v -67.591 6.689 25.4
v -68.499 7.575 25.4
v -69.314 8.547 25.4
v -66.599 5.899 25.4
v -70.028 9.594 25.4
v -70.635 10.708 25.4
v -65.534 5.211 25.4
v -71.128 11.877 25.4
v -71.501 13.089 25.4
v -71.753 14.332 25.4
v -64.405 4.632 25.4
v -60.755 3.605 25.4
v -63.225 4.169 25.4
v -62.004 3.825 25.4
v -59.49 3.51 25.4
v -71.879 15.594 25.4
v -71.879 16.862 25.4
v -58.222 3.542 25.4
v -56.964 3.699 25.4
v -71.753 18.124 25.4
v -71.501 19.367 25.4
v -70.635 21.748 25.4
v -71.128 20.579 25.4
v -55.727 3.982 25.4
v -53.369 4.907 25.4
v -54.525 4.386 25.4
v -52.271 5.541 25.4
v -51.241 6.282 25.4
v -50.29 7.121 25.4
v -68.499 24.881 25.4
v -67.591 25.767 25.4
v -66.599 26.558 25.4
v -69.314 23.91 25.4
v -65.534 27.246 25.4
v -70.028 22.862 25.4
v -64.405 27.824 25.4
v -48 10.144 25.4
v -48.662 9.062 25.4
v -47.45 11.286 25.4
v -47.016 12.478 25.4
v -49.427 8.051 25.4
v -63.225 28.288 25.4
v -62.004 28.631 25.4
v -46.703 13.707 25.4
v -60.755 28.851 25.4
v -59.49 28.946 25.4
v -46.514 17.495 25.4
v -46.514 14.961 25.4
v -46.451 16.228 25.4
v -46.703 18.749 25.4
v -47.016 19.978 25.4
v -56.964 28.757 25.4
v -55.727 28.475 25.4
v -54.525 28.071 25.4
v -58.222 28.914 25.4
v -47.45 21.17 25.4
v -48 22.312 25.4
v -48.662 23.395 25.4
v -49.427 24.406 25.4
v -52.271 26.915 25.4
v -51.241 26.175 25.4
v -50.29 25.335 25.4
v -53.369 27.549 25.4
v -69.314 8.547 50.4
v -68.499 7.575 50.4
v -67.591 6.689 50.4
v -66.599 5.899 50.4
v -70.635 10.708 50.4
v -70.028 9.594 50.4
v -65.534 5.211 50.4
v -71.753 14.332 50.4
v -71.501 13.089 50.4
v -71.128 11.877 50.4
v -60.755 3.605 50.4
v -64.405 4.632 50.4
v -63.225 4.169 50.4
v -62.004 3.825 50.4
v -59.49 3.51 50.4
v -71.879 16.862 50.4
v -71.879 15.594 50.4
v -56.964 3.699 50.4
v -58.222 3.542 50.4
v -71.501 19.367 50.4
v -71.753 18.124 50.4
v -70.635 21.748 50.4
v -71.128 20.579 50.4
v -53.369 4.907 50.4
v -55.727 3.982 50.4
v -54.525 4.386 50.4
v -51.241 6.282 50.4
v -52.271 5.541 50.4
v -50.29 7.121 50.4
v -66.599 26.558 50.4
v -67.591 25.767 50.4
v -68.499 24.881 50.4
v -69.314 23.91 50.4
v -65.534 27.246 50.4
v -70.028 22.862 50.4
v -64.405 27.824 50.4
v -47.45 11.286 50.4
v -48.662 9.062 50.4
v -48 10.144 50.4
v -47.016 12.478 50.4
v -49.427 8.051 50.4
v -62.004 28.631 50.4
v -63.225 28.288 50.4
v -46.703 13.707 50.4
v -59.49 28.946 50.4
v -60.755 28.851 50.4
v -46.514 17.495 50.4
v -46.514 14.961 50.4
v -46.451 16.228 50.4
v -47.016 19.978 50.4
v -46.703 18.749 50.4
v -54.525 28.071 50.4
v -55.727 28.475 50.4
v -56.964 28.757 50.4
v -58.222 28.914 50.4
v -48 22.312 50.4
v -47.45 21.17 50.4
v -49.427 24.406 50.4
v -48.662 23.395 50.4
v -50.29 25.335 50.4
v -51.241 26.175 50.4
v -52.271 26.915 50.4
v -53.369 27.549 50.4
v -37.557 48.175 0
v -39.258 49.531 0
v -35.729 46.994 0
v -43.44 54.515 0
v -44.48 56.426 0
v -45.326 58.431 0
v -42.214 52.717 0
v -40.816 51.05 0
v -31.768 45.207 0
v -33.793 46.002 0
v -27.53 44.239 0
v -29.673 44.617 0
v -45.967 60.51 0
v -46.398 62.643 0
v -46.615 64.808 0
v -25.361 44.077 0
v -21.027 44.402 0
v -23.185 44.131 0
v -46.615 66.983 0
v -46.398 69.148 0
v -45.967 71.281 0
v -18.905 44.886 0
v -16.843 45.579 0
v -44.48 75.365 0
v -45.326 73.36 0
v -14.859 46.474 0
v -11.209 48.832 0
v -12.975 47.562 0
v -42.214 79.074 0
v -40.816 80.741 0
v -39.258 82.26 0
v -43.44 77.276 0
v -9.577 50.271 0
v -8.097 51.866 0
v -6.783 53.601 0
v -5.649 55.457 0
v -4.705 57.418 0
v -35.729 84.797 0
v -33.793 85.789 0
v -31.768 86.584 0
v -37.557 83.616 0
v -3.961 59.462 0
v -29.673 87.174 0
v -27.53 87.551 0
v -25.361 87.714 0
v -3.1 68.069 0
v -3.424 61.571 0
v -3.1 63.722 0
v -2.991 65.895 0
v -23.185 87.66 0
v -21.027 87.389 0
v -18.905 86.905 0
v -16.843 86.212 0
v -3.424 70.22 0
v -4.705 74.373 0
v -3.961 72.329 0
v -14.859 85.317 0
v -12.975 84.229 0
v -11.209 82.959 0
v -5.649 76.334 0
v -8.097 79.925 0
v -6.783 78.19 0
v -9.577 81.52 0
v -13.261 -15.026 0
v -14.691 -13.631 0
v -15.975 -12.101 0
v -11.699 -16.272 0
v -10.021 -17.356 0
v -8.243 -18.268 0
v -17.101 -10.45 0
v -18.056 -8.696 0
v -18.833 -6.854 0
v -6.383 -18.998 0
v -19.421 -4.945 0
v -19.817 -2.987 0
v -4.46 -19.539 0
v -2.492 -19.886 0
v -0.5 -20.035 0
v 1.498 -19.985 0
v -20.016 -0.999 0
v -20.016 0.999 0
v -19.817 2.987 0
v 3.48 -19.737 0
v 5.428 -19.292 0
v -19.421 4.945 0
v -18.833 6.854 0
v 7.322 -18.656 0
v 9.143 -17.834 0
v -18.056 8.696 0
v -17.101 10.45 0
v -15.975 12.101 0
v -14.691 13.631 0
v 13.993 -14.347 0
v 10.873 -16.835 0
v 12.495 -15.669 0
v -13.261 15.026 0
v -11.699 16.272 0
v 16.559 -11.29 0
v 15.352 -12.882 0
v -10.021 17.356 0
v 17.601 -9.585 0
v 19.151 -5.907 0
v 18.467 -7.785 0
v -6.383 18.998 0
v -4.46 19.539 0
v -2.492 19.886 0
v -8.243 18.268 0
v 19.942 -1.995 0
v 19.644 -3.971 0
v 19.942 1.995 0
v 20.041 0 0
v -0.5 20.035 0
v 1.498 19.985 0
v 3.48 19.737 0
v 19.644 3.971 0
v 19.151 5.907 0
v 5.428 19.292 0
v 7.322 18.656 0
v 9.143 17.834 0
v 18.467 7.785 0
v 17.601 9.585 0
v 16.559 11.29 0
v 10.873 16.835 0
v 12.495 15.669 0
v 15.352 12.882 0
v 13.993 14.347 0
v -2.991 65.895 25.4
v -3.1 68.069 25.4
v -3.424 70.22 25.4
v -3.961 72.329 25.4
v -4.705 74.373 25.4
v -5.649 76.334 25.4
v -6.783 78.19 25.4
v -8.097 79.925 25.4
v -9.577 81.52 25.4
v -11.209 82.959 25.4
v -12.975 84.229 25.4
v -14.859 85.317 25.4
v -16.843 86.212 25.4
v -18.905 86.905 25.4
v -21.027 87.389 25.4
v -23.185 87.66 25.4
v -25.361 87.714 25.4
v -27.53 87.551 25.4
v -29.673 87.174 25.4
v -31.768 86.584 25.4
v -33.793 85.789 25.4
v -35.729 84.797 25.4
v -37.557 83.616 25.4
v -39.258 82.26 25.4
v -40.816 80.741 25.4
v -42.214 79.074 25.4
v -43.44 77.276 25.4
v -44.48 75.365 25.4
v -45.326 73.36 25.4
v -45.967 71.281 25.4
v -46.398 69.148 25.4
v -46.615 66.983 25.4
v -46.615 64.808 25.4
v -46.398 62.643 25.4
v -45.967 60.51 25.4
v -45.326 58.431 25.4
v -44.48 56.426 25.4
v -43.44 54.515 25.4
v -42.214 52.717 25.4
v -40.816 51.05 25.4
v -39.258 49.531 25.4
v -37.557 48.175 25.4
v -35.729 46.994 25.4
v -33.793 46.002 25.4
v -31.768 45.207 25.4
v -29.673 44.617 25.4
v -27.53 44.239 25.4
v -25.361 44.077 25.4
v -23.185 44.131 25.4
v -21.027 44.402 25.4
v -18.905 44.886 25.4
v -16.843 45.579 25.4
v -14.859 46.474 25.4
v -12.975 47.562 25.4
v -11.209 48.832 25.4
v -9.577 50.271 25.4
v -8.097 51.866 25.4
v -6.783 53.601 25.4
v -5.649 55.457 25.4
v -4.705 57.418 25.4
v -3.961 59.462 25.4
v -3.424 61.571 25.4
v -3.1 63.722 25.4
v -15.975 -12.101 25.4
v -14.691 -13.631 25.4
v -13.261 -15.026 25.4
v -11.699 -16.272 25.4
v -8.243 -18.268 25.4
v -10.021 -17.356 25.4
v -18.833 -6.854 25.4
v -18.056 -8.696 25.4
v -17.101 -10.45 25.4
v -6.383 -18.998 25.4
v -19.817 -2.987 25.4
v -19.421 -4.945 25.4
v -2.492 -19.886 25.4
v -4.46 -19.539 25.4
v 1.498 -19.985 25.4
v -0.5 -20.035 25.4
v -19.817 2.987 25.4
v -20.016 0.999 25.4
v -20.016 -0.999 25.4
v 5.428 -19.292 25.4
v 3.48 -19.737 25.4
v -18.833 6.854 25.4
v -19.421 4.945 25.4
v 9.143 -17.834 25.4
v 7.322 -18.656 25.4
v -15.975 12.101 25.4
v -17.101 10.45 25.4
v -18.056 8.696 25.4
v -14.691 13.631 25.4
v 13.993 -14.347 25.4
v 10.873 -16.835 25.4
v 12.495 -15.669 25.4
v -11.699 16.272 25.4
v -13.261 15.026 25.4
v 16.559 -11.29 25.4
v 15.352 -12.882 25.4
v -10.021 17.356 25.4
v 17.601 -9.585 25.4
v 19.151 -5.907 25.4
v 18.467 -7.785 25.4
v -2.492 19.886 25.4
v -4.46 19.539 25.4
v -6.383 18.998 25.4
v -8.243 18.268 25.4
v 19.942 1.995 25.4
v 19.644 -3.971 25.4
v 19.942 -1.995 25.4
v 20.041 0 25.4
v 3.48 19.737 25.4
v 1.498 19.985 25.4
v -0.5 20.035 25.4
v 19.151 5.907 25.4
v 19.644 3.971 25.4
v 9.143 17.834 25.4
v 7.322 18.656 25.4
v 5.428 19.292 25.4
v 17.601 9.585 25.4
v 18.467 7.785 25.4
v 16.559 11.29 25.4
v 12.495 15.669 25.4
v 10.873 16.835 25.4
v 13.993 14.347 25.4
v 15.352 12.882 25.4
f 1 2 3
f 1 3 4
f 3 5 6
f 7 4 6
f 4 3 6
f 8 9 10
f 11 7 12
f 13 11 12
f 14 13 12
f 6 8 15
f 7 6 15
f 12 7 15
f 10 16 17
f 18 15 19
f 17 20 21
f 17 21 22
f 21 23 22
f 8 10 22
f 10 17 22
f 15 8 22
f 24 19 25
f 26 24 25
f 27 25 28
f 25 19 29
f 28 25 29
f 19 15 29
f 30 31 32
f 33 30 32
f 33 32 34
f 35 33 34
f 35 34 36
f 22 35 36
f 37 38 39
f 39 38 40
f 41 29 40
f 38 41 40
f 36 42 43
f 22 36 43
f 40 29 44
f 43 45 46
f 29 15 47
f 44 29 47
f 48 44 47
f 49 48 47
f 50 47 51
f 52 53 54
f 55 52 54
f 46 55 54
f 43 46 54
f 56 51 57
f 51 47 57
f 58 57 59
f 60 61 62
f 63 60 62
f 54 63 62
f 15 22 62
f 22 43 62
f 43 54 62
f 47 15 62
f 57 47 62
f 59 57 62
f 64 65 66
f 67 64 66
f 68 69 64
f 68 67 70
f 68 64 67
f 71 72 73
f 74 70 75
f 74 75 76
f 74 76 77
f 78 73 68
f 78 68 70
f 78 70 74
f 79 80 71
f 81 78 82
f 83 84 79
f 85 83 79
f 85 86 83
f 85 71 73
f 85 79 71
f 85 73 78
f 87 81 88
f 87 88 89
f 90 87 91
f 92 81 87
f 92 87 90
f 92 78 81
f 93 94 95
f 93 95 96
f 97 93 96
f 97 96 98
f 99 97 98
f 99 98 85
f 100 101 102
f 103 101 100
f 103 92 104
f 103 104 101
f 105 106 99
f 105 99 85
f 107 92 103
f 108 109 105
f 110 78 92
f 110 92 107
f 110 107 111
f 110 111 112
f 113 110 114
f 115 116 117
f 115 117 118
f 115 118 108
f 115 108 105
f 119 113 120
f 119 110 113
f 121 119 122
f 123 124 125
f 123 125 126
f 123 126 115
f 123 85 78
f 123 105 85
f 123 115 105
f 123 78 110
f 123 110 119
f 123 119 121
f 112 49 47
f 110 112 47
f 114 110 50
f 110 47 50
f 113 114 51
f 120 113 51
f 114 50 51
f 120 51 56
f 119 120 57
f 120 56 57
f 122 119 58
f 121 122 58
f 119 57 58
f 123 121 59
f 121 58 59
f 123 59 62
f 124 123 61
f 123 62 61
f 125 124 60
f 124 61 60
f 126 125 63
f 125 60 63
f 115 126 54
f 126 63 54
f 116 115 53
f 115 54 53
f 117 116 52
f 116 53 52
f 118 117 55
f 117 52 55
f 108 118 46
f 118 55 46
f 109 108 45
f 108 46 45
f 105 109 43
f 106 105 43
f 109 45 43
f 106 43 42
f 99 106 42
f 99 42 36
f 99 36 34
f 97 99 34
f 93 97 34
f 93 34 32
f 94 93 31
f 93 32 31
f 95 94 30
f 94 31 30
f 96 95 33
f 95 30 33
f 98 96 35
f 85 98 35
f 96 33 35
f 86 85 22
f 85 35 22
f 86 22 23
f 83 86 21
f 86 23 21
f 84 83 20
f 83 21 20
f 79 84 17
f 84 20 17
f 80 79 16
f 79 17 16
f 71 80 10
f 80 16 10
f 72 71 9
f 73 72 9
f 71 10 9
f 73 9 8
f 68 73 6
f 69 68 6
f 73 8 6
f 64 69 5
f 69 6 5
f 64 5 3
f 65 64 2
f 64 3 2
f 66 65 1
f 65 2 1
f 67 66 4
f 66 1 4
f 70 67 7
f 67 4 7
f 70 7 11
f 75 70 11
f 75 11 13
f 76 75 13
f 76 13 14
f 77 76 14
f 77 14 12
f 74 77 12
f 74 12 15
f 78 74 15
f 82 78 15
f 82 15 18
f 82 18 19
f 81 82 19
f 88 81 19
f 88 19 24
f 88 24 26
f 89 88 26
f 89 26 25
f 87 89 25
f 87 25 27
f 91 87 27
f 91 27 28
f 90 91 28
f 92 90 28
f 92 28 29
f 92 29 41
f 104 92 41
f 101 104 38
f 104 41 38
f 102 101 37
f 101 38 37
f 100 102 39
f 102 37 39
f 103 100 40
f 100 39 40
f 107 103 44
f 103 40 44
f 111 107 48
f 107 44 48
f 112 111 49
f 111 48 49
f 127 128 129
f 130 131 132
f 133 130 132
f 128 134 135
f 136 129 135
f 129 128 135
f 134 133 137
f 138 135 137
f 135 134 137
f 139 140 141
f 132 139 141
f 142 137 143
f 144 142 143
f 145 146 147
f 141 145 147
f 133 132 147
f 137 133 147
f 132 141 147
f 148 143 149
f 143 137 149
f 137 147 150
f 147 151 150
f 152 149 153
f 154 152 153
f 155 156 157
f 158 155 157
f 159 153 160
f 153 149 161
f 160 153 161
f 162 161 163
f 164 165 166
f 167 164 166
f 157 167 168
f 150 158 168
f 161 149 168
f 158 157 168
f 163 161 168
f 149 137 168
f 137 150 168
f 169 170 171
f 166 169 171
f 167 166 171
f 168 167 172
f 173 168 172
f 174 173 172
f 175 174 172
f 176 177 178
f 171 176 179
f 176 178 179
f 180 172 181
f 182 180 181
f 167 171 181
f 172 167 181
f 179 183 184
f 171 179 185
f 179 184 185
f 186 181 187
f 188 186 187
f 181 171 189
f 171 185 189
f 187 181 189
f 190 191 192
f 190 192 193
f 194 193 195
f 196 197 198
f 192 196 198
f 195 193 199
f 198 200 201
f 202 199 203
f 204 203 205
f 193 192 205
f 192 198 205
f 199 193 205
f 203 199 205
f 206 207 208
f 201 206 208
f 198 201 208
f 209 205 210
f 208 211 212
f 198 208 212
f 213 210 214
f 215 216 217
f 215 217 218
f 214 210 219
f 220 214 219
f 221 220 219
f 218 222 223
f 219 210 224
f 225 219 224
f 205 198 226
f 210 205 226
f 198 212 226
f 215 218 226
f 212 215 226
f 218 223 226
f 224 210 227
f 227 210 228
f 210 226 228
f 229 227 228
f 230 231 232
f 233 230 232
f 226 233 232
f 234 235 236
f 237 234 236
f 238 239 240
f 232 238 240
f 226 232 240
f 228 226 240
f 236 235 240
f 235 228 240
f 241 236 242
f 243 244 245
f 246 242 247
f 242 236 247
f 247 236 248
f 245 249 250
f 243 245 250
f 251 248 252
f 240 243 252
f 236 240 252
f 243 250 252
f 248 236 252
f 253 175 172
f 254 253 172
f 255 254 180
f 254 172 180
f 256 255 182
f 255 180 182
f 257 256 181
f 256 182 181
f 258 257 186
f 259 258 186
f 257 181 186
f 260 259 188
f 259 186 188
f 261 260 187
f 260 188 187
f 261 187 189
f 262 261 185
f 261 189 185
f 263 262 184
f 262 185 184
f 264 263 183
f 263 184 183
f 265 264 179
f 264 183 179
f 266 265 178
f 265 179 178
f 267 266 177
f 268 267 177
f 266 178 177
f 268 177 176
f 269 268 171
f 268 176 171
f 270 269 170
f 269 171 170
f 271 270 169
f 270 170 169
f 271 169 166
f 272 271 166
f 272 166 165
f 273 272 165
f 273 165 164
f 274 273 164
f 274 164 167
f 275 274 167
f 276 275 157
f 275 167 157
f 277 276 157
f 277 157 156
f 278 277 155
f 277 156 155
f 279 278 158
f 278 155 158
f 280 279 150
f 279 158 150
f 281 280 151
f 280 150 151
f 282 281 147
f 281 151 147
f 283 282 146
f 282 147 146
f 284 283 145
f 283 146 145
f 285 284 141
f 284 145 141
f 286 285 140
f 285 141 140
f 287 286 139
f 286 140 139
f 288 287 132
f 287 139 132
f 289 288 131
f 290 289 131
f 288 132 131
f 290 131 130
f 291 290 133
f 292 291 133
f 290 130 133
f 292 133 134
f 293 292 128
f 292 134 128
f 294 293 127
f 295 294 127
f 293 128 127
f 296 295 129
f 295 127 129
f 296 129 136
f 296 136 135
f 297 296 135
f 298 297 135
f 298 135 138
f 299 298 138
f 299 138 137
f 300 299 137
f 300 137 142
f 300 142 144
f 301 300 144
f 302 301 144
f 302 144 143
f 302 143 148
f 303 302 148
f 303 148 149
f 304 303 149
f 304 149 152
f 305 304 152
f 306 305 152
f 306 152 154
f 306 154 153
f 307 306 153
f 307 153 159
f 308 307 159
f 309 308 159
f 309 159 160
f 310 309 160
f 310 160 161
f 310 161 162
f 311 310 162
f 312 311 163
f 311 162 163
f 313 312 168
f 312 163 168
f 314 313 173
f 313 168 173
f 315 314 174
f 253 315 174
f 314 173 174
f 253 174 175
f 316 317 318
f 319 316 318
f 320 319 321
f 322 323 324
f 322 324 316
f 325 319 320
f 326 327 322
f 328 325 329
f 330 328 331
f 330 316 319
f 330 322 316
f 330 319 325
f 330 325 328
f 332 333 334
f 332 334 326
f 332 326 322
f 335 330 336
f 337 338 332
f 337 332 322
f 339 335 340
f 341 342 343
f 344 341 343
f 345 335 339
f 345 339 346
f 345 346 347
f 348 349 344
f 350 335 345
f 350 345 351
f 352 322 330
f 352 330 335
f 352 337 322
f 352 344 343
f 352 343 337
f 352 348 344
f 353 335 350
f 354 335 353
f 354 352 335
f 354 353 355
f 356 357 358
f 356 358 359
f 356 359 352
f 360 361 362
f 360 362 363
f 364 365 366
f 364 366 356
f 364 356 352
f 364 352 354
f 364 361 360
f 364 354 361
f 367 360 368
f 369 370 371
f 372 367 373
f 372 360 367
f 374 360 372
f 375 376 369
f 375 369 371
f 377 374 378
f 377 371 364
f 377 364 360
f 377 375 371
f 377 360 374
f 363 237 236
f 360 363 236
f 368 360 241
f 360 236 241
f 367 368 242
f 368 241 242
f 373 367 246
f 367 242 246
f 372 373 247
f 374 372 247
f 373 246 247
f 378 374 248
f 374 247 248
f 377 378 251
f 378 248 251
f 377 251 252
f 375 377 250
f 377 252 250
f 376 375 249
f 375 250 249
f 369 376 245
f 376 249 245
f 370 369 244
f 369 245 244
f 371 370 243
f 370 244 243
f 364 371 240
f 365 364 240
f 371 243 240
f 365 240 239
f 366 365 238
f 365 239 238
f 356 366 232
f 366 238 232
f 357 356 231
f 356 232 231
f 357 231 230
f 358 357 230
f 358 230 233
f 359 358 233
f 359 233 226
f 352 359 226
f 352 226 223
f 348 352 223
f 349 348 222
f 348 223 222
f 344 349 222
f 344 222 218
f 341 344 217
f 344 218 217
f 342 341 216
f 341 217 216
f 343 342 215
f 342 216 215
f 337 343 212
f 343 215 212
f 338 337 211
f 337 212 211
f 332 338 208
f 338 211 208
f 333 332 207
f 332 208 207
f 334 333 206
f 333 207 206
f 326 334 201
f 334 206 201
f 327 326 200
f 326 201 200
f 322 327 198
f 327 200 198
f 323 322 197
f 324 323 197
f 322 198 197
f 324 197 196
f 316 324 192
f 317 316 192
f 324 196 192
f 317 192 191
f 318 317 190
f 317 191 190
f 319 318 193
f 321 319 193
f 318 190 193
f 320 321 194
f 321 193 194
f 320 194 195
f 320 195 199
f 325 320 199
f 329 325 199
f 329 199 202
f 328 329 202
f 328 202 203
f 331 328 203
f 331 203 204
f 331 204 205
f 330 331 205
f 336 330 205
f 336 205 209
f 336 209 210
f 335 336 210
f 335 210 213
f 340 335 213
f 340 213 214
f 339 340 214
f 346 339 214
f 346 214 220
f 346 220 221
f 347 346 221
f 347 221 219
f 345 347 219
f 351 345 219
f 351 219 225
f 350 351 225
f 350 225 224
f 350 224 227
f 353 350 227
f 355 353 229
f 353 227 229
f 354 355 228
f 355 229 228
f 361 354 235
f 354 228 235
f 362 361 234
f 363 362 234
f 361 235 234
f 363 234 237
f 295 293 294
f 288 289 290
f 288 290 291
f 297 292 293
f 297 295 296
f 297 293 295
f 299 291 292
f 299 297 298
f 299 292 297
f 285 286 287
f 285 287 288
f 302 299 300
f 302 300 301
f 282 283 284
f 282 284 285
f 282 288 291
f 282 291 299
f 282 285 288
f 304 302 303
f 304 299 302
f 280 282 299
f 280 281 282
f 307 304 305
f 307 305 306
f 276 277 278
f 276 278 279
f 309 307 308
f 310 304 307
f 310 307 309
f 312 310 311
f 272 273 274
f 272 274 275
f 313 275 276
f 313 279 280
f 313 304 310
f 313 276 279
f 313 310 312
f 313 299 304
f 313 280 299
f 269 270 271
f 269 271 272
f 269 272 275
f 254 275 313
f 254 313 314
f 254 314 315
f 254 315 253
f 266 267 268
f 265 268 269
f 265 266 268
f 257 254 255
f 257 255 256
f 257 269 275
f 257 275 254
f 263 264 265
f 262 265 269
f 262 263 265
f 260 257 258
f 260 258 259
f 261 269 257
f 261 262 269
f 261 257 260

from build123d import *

# Parameters (mm, degrees)
F0_R     = 20.041176
F0_R_2   = 21.825383
F1_DEPTH = 25.4
F2_R     = 12.721916
F3_DEPTH = 25


with BuildPart() as f1:
    # F0 (on Top) → F1 (new body)
    with BuildSketch(Plane.XY):
        Circle(F0_R)
        with Locations((-24.816439, 65.895483)):
            Circle(F0_R_2)
    extrude(amount=F1_DEPTH)


with BuildPart() as f3:
    # F2 (on face) → F3 (new body)
    with BuildSketch(Plane.XY.offset(25.4)):
        with Locations((-59.172947, 16.228132)):
            Circle(F2_R)
    extrude(amount=F3_DEPTH)


solid = Compound([f1.part, f3.part])
